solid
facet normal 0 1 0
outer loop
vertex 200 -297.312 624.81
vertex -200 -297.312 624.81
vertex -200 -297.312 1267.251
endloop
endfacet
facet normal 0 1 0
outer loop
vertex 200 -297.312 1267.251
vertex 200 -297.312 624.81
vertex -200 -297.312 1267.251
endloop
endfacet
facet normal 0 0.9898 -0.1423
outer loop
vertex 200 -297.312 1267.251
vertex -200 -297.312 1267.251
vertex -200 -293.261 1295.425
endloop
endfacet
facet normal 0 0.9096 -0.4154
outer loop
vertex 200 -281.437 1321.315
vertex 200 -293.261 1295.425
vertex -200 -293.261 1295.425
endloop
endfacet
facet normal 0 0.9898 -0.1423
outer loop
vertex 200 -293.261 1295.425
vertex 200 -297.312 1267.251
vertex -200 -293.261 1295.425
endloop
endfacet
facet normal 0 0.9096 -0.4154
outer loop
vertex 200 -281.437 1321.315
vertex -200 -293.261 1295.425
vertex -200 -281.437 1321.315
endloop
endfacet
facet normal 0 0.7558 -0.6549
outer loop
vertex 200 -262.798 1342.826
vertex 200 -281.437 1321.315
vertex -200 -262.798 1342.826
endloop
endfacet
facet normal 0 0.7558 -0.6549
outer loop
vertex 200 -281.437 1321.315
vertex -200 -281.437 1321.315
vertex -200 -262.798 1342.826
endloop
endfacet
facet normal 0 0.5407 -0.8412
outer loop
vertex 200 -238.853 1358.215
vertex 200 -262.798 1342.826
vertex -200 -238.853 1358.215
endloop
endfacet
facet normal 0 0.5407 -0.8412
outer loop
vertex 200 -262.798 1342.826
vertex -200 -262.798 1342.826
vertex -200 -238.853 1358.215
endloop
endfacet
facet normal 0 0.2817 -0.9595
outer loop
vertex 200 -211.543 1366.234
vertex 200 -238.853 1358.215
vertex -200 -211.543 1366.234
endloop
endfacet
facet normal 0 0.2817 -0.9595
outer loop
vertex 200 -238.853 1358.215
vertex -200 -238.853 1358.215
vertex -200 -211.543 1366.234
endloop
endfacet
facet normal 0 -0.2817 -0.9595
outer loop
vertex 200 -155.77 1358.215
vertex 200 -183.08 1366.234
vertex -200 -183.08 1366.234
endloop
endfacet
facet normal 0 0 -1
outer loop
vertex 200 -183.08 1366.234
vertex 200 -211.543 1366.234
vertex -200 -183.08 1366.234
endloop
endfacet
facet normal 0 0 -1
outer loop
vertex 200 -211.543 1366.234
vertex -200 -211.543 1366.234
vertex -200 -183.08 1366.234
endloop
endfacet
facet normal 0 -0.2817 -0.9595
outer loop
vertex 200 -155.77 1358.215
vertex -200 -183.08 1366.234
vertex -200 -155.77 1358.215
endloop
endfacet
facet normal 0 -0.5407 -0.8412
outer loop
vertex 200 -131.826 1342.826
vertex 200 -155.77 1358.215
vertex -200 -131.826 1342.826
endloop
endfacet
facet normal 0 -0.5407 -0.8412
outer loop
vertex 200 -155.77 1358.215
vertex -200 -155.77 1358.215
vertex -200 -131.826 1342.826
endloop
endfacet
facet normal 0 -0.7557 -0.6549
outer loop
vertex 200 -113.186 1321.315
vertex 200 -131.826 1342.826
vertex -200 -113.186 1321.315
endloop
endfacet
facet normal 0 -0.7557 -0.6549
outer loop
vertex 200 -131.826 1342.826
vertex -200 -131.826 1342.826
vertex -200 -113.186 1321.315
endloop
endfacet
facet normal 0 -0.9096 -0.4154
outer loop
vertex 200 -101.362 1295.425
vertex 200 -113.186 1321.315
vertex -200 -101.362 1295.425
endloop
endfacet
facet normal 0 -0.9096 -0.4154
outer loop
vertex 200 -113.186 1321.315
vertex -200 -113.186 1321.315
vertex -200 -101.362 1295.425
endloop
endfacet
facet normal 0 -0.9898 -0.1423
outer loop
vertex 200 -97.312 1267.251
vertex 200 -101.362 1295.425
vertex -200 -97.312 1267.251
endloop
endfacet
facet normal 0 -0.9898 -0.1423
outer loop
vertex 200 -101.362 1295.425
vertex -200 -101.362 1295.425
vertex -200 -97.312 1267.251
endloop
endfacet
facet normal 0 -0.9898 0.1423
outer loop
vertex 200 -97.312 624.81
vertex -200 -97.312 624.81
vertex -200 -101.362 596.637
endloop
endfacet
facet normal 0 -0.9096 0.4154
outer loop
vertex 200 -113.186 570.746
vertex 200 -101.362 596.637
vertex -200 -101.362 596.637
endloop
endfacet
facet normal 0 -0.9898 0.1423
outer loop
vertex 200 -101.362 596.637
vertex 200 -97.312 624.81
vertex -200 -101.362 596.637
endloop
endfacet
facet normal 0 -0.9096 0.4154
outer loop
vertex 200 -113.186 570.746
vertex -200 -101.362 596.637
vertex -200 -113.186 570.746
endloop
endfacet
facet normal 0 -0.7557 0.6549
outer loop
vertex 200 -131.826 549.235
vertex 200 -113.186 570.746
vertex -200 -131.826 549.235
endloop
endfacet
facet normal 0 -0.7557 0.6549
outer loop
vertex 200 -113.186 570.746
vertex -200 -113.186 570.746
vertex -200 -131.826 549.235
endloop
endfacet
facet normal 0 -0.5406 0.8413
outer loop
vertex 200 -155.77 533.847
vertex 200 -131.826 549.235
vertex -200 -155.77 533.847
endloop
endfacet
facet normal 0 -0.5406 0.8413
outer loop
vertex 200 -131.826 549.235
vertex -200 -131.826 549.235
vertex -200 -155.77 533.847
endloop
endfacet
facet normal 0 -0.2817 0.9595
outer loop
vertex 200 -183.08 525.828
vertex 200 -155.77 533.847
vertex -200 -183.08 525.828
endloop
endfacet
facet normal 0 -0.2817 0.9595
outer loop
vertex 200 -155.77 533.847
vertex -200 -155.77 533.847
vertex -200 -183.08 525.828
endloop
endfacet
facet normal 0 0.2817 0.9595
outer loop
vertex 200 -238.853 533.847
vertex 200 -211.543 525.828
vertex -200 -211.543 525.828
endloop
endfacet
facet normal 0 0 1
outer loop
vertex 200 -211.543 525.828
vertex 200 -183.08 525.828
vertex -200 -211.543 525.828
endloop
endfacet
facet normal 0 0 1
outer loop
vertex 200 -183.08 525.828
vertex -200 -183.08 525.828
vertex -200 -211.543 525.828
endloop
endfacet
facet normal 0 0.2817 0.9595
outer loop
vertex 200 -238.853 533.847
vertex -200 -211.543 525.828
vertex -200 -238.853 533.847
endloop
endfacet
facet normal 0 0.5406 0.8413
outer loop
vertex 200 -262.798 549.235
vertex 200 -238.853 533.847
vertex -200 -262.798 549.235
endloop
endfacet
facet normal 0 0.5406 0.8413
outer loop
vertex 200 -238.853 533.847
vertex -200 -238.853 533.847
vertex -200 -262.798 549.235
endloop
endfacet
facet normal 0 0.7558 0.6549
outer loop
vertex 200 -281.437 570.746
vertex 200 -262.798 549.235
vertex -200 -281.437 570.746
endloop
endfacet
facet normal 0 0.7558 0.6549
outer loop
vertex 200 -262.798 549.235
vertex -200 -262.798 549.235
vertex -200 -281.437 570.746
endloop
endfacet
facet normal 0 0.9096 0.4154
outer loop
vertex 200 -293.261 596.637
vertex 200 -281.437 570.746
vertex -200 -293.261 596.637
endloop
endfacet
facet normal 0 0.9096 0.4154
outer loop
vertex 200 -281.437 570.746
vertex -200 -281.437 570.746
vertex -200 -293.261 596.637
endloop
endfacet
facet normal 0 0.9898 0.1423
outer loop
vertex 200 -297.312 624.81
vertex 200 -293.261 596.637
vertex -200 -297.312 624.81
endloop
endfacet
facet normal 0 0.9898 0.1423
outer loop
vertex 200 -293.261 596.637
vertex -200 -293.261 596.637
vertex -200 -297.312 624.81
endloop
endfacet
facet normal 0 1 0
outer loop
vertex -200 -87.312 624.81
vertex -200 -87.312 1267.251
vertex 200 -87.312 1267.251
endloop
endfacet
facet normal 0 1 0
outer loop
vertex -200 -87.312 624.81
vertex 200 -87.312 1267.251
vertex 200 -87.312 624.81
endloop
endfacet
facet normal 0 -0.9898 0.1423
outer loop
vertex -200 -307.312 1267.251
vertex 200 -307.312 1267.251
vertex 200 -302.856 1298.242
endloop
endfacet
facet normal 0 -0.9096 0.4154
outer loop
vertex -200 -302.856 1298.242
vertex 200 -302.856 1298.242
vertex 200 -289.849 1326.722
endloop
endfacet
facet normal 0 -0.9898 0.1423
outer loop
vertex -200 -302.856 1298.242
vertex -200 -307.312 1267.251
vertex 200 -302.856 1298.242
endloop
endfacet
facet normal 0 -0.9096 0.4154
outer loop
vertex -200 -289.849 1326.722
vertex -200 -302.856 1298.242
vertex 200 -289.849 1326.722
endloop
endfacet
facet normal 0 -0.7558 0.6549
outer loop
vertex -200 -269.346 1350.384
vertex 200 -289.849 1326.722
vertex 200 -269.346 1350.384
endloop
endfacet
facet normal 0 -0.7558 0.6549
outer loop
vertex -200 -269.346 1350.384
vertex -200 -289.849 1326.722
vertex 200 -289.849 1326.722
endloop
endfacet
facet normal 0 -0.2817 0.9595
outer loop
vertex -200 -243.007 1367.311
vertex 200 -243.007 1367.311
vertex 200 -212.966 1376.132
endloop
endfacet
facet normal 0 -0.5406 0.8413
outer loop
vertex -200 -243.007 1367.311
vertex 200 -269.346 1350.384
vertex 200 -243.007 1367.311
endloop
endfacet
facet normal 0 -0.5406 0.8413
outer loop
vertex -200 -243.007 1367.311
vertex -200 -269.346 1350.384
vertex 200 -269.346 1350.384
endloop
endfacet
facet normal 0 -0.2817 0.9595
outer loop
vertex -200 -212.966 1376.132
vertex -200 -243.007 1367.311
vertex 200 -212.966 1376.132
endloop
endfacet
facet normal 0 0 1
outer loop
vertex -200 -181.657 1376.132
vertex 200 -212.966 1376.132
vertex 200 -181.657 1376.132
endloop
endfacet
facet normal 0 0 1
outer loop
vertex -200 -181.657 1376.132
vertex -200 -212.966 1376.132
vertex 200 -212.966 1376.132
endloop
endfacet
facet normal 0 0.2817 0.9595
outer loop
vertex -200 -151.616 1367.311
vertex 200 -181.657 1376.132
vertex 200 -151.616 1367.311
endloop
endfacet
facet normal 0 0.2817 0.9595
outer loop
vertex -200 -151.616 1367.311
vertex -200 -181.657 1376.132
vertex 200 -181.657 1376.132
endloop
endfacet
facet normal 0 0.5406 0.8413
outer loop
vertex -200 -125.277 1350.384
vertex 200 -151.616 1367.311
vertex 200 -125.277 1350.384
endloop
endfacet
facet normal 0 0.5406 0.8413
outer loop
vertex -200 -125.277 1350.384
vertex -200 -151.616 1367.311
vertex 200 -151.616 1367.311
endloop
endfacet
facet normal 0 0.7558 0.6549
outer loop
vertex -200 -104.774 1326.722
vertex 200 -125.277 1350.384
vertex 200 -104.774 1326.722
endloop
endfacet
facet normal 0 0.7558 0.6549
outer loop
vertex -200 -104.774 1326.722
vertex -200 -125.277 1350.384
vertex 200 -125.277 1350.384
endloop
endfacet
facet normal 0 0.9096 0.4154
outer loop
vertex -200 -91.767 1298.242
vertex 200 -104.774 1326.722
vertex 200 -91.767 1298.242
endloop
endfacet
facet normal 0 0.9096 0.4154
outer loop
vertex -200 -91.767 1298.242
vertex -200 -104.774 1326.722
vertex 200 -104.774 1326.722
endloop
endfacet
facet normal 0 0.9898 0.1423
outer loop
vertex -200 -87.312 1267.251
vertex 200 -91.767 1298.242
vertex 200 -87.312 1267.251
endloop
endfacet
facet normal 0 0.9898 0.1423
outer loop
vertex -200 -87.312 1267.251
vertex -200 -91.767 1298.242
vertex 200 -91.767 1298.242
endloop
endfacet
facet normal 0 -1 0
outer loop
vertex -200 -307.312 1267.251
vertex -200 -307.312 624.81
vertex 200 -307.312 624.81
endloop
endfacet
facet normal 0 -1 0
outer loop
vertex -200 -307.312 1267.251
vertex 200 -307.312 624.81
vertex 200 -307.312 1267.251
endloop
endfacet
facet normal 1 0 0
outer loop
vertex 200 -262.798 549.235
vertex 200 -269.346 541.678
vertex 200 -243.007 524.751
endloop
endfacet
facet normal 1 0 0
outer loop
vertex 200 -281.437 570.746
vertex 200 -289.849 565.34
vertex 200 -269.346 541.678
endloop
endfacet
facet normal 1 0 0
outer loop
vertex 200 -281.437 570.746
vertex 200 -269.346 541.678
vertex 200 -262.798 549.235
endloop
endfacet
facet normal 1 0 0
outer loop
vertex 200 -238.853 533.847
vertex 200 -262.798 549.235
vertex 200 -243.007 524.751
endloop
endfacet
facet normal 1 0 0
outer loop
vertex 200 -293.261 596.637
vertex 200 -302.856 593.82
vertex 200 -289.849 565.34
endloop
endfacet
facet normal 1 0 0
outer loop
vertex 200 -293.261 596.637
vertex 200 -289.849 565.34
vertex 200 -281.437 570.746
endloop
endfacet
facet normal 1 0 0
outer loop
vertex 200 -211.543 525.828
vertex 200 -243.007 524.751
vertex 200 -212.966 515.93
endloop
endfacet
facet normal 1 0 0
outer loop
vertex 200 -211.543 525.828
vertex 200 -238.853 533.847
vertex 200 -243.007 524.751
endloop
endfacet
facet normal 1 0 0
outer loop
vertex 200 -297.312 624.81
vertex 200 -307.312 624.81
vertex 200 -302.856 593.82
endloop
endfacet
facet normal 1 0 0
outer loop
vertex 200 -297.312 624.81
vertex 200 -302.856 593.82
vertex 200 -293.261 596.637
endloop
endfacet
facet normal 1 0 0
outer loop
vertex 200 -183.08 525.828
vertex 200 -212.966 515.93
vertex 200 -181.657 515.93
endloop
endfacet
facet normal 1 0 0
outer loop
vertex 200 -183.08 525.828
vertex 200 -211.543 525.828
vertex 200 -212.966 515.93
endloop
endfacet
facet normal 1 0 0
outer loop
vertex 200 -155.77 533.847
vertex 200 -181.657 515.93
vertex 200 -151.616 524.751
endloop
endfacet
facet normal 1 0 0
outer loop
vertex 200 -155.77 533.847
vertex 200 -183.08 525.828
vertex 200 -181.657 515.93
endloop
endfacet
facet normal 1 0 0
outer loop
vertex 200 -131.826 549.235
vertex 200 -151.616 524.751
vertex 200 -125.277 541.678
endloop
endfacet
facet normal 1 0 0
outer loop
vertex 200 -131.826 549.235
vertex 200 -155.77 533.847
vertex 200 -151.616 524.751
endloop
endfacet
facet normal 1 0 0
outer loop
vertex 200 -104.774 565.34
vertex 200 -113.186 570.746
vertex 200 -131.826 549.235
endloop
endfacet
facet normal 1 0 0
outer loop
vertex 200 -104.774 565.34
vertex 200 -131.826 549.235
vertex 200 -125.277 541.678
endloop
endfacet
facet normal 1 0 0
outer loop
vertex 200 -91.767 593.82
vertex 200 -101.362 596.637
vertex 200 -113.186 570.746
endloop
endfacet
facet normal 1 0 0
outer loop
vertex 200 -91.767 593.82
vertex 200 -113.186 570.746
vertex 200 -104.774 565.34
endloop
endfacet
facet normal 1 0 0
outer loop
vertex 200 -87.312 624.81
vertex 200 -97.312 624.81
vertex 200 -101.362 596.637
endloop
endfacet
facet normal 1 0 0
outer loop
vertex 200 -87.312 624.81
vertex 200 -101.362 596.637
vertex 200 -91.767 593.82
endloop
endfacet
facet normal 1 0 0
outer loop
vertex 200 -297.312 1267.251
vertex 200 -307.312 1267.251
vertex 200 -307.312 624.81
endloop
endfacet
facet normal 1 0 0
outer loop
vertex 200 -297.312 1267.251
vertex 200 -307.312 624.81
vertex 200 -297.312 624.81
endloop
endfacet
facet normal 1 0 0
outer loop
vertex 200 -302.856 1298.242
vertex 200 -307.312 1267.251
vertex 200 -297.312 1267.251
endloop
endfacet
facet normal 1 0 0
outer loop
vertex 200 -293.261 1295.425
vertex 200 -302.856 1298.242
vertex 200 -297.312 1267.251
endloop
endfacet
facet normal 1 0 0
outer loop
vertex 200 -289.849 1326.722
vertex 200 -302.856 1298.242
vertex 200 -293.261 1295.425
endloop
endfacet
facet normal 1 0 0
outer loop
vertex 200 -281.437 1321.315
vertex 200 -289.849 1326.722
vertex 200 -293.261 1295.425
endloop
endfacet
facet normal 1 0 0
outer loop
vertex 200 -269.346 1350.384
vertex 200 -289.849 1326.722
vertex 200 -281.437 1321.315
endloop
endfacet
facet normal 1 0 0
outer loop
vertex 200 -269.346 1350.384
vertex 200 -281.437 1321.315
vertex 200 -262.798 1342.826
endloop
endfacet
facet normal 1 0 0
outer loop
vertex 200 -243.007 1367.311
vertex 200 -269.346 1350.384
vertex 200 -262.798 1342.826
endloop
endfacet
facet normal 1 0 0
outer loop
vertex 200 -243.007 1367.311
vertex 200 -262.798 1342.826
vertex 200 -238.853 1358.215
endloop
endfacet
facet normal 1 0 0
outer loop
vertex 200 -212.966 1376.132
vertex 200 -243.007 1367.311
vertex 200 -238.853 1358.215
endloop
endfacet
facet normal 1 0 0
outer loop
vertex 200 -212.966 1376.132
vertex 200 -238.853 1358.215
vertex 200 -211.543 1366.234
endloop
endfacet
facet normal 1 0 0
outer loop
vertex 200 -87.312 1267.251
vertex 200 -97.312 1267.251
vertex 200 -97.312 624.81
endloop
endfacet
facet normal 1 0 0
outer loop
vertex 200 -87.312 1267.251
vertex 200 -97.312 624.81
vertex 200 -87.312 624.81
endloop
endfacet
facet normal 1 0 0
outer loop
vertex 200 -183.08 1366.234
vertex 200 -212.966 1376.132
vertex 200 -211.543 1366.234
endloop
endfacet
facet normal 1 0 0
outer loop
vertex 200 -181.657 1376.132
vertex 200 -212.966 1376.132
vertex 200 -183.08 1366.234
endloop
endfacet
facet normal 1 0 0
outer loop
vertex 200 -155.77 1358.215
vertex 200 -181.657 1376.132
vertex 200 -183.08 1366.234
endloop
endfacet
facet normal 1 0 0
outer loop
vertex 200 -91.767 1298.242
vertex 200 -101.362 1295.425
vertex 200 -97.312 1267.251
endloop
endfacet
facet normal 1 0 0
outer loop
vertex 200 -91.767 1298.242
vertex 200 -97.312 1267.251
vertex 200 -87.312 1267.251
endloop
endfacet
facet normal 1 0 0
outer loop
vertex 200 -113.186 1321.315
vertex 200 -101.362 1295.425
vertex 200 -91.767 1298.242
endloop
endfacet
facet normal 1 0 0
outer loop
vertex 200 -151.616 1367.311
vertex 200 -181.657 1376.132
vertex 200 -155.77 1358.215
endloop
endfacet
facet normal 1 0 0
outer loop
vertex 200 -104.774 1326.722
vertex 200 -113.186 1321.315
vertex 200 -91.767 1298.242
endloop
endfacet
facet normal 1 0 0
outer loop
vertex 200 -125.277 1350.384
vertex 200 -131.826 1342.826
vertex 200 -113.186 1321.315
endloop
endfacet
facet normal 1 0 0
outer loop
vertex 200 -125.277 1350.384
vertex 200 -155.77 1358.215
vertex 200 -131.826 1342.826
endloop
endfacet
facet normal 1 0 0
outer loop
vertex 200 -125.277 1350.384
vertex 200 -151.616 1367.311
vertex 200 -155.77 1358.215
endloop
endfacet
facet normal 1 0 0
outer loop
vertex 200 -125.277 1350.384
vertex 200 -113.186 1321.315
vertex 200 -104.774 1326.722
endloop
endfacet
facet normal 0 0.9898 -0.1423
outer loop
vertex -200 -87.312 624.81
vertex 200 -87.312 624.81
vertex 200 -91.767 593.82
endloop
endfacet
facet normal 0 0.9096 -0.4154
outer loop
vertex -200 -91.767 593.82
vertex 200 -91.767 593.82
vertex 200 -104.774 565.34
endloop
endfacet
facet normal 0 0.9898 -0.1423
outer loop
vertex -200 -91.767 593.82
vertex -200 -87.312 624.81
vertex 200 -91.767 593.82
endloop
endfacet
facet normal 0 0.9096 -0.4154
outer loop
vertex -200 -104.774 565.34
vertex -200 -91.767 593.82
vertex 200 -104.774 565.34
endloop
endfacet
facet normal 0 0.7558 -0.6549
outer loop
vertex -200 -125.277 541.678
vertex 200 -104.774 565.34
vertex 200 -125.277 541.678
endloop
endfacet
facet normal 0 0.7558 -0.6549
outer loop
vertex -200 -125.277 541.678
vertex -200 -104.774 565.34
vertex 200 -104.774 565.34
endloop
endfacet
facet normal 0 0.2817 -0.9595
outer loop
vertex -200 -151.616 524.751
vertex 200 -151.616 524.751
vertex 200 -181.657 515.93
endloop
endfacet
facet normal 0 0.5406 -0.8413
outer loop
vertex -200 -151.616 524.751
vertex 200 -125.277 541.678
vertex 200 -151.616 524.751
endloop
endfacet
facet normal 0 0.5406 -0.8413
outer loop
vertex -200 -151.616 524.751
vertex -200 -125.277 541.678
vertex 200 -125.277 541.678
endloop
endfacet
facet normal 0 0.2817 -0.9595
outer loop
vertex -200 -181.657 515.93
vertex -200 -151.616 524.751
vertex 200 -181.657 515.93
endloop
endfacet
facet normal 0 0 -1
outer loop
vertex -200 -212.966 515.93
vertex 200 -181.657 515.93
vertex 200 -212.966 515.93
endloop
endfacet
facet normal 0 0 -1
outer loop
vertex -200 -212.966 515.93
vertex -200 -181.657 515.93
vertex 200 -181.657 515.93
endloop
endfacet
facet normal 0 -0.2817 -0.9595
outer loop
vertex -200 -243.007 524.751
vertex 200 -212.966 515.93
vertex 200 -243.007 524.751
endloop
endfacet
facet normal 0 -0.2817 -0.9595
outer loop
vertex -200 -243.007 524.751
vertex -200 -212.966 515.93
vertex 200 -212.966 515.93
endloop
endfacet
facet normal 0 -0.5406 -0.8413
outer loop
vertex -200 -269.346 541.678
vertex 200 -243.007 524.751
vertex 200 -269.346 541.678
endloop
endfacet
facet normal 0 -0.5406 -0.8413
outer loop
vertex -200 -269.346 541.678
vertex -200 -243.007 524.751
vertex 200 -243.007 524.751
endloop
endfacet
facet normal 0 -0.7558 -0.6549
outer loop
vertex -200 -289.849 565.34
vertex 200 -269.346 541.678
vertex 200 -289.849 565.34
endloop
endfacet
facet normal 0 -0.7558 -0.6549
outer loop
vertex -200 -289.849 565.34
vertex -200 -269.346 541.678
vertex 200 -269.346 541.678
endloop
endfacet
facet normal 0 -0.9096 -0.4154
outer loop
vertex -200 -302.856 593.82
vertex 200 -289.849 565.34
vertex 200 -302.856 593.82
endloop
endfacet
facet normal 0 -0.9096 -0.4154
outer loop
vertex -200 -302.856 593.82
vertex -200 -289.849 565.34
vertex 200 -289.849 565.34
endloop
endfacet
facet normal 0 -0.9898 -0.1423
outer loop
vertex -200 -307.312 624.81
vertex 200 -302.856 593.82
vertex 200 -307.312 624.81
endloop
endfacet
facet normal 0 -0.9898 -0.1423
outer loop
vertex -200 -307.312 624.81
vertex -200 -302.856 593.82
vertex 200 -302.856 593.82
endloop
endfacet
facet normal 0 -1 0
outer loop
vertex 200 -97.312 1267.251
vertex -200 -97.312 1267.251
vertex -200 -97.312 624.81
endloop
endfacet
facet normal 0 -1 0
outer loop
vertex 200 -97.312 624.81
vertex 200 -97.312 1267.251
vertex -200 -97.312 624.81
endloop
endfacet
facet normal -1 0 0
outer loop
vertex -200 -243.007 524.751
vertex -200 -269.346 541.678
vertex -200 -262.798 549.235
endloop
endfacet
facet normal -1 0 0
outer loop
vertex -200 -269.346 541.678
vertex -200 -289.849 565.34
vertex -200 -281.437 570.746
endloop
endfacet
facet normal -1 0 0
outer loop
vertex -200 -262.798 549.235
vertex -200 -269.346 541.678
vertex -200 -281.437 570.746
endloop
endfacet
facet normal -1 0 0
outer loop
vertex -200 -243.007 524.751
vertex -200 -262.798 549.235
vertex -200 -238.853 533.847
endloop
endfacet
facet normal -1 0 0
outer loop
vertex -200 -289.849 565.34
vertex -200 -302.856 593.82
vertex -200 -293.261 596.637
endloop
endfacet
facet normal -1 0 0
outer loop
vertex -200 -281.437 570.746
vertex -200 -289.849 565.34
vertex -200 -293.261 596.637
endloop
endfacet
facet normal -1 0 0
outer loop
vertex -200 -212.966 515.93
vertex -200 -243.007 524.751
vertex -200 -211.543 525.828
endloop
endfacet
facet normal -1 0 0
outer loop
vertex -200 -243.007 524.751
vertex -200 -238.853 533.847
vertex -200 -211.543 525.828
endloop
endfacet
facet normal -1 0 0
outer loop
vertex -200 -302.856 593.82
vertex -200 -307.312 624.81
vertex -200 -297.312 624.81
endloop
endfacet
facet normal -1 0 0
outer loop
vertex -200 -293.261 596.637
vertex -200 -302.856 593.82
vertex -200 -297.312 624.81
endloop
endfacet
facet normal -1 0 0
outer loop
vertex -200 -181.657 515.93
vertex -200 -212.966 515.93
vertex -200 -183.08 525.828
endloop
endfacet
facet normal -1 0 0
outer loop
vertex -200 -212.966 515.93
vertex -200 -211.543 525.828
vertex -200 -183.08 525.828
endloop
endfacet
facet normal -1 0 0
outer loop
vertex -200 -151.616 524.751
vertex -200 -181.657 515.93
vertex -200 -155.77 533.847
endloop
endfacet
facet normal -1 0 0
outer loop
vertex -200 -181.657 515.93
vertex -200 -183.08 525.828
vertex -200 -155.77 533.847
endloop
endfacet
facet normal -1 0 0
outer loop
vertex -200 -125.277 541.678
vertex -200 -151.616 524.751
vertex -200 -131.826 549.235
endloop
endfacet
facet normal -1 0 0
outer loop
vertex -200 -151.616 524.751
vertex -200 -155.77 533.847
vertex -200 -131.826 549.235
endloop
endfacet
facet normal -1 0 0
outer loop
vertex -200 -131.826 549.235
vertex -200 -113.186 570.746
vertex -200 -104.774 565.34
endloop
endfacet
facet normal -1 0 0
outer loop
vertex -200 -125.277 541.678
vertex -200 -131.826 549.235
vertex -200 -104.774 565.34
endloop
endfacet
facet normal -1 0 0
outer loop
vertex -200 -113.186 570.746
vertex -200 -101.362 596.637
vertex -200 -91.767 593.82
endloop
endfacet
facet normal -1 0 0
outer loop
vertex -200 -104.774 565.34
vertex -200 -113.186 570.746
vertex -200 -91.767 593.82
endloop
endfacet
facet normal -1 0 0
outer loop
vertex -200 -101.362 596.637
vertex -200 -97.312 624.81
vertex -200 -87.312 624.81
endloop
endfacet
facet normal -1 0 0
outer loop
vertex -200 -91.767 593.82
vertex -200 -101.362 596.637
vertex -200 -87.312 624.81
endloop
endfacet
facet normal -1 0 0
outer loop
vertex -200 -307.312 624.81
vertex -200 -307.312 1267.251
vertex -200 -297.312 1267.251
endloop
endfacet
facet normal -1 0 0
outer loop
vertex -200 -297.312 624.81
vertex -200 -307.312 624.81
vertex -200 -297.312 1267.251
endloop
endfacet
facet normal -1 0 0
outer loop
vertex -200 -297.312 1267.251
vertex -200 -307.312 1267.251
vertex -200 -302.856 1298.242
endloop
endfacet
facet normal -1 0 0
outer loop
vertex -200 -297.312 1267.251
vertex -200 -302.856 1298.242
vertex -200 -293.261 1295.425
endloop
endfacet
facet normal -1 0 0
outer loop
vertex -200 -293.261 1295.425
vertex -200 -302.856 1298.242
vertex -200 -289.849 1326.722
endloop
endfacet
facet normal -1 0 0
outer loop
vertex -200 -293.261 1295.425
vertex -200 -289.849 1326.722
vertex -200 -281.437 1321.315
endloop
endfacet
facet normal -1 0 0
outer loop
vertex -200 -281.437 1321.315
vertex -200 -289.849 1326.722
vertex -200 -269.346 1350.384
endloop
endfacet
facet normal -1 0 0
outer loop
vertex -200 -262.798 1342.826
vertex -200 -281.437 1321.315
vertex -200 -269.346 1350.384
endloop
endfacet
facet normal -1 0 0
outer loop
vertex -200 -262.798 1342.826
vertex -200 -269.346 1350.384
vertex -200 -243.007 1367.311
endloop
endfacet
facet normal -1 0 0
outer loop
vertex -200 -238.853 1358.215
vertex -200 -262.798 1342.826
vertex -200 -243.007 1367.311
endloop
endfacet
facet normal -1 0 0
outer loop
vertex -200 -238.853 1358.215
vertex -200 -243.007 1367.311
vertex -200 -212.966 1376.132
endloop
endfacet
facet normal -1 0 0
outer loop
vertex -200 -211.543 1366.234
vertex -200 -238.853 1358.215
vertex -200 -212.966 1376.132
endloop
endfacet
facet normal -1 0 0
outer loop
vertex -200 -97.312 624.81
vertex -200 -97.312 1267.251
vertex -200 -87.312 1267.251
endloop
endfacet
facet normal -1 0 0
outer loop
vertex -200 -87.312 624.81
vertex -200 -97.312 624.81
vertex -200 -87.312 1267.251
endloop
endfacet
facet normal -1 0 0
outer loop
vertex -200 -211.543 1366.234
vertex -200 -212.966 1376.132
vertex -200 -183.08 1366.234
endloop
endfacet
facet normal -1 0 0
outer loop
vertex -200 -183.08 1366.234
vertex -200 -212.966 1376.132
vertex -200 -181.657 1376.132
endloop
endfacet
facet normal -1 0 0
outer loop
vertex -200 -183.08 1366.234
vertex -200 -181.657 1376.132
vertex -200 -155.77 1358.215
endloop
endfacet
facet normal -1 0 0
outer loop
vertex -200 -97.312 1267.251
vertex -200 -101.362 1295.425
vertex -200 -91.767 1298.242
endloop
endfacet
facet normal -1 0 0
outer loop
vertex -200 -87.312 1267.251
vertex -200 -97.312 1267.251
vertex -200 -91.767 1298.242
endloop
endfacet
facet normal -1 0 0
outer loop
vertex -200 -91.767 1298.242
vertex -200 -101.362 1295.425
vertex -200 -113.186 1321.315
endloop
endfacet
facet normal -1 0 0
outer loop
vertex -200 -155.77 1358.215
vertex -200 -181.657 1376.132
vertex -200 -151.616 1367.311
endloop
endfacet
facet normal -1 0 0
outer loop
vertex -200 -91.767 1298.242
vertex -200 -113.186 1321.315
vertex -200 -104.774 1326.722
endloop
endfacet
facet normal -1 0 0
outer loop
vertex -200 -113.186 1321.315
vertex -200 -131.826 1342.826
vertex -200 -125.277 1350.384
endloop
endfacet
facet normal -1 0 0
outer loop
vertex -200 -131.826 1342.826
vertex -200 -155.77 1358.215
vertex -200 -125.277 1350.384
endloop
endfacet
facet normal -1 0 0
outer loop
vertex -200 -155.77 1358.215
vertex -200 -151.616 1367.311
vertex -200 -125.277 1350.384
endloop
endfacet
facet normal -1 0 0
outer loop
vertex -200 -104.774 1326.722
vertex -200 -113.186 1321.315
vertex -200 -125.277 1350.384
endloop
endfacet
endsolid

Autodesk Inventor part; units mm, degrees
ref_plane "YZ Plane" through (0, 0, 0) normal (1, 0, 0) x (0, 1, 0)
ref_plane "XZ Plane" through (0, 0, 0) normal (0, 1, 0) x (-1, 0, 0)
ref_plane "XY Plane" through (0, 0, 0) normal (0, 0, 1) x (1, 0, 0)
sketch "Skizze3" plane through (0, 0, 0) normal (1, 0, 0) x (0, 1, 0)
  line L0 (-97.3116, 946.0308) -> (-97.3116, 624.8101)
  arc A0 (-297.3116, 624.8101) -> (-97.3116, 624.8101) centre (-197.3116, 624.8101) ccw
  line L1 (-297.3116, 624.8101) -> (-297.3116, 1009.2763)
  line L2 (-97.3116, 946.0308) -> (-97.3116, 1267.2514)
  arc A1 (-97.3116, 1267.2514) -> (-297.3116, 1267.2514) centre (-197.3116, 1267.2514) ccw
  line L3 (-297.3116, 1267.2514) -> (-297.3116, 1009.2763)
  line L4 (-87.3116, 946.0308) -> (-87.3116, 624.8101)
  arc A2 (-307.3116, 624.8101) -> (-87.3116, 624.8101) centre (-197.3116, 624.8101) ccw
  line L5 (-307.3116, 624.8101) -> (-307.3116, 946.0308)
  line L6 (-87.3116, 946.0308) -> (-307.3116, 946.0308)
  line L7 (-307.3116, 1267.2514) -> (-307.3116, 946.0308)
  line L8 (-87.3116, 946.0308) -> (-87.3116, 1267.2514)
  arc A3 (-87.3116, 1267.2514) -> (-307.3116, 1267.2514) centre (-197.3116, 1267.2514) ccw
  point P0 (0, 0)
  dimension "d0" = 110
  dimension "d1" = 100
extrude "Extrusion1" add sketch "Skizze3" along normal mid plane 400 contours L6 L4 A2 L5 L1 A0 L0 | L2 A1 L3 L1 L6 L7 A3 L8
properties part number "Förderband"
